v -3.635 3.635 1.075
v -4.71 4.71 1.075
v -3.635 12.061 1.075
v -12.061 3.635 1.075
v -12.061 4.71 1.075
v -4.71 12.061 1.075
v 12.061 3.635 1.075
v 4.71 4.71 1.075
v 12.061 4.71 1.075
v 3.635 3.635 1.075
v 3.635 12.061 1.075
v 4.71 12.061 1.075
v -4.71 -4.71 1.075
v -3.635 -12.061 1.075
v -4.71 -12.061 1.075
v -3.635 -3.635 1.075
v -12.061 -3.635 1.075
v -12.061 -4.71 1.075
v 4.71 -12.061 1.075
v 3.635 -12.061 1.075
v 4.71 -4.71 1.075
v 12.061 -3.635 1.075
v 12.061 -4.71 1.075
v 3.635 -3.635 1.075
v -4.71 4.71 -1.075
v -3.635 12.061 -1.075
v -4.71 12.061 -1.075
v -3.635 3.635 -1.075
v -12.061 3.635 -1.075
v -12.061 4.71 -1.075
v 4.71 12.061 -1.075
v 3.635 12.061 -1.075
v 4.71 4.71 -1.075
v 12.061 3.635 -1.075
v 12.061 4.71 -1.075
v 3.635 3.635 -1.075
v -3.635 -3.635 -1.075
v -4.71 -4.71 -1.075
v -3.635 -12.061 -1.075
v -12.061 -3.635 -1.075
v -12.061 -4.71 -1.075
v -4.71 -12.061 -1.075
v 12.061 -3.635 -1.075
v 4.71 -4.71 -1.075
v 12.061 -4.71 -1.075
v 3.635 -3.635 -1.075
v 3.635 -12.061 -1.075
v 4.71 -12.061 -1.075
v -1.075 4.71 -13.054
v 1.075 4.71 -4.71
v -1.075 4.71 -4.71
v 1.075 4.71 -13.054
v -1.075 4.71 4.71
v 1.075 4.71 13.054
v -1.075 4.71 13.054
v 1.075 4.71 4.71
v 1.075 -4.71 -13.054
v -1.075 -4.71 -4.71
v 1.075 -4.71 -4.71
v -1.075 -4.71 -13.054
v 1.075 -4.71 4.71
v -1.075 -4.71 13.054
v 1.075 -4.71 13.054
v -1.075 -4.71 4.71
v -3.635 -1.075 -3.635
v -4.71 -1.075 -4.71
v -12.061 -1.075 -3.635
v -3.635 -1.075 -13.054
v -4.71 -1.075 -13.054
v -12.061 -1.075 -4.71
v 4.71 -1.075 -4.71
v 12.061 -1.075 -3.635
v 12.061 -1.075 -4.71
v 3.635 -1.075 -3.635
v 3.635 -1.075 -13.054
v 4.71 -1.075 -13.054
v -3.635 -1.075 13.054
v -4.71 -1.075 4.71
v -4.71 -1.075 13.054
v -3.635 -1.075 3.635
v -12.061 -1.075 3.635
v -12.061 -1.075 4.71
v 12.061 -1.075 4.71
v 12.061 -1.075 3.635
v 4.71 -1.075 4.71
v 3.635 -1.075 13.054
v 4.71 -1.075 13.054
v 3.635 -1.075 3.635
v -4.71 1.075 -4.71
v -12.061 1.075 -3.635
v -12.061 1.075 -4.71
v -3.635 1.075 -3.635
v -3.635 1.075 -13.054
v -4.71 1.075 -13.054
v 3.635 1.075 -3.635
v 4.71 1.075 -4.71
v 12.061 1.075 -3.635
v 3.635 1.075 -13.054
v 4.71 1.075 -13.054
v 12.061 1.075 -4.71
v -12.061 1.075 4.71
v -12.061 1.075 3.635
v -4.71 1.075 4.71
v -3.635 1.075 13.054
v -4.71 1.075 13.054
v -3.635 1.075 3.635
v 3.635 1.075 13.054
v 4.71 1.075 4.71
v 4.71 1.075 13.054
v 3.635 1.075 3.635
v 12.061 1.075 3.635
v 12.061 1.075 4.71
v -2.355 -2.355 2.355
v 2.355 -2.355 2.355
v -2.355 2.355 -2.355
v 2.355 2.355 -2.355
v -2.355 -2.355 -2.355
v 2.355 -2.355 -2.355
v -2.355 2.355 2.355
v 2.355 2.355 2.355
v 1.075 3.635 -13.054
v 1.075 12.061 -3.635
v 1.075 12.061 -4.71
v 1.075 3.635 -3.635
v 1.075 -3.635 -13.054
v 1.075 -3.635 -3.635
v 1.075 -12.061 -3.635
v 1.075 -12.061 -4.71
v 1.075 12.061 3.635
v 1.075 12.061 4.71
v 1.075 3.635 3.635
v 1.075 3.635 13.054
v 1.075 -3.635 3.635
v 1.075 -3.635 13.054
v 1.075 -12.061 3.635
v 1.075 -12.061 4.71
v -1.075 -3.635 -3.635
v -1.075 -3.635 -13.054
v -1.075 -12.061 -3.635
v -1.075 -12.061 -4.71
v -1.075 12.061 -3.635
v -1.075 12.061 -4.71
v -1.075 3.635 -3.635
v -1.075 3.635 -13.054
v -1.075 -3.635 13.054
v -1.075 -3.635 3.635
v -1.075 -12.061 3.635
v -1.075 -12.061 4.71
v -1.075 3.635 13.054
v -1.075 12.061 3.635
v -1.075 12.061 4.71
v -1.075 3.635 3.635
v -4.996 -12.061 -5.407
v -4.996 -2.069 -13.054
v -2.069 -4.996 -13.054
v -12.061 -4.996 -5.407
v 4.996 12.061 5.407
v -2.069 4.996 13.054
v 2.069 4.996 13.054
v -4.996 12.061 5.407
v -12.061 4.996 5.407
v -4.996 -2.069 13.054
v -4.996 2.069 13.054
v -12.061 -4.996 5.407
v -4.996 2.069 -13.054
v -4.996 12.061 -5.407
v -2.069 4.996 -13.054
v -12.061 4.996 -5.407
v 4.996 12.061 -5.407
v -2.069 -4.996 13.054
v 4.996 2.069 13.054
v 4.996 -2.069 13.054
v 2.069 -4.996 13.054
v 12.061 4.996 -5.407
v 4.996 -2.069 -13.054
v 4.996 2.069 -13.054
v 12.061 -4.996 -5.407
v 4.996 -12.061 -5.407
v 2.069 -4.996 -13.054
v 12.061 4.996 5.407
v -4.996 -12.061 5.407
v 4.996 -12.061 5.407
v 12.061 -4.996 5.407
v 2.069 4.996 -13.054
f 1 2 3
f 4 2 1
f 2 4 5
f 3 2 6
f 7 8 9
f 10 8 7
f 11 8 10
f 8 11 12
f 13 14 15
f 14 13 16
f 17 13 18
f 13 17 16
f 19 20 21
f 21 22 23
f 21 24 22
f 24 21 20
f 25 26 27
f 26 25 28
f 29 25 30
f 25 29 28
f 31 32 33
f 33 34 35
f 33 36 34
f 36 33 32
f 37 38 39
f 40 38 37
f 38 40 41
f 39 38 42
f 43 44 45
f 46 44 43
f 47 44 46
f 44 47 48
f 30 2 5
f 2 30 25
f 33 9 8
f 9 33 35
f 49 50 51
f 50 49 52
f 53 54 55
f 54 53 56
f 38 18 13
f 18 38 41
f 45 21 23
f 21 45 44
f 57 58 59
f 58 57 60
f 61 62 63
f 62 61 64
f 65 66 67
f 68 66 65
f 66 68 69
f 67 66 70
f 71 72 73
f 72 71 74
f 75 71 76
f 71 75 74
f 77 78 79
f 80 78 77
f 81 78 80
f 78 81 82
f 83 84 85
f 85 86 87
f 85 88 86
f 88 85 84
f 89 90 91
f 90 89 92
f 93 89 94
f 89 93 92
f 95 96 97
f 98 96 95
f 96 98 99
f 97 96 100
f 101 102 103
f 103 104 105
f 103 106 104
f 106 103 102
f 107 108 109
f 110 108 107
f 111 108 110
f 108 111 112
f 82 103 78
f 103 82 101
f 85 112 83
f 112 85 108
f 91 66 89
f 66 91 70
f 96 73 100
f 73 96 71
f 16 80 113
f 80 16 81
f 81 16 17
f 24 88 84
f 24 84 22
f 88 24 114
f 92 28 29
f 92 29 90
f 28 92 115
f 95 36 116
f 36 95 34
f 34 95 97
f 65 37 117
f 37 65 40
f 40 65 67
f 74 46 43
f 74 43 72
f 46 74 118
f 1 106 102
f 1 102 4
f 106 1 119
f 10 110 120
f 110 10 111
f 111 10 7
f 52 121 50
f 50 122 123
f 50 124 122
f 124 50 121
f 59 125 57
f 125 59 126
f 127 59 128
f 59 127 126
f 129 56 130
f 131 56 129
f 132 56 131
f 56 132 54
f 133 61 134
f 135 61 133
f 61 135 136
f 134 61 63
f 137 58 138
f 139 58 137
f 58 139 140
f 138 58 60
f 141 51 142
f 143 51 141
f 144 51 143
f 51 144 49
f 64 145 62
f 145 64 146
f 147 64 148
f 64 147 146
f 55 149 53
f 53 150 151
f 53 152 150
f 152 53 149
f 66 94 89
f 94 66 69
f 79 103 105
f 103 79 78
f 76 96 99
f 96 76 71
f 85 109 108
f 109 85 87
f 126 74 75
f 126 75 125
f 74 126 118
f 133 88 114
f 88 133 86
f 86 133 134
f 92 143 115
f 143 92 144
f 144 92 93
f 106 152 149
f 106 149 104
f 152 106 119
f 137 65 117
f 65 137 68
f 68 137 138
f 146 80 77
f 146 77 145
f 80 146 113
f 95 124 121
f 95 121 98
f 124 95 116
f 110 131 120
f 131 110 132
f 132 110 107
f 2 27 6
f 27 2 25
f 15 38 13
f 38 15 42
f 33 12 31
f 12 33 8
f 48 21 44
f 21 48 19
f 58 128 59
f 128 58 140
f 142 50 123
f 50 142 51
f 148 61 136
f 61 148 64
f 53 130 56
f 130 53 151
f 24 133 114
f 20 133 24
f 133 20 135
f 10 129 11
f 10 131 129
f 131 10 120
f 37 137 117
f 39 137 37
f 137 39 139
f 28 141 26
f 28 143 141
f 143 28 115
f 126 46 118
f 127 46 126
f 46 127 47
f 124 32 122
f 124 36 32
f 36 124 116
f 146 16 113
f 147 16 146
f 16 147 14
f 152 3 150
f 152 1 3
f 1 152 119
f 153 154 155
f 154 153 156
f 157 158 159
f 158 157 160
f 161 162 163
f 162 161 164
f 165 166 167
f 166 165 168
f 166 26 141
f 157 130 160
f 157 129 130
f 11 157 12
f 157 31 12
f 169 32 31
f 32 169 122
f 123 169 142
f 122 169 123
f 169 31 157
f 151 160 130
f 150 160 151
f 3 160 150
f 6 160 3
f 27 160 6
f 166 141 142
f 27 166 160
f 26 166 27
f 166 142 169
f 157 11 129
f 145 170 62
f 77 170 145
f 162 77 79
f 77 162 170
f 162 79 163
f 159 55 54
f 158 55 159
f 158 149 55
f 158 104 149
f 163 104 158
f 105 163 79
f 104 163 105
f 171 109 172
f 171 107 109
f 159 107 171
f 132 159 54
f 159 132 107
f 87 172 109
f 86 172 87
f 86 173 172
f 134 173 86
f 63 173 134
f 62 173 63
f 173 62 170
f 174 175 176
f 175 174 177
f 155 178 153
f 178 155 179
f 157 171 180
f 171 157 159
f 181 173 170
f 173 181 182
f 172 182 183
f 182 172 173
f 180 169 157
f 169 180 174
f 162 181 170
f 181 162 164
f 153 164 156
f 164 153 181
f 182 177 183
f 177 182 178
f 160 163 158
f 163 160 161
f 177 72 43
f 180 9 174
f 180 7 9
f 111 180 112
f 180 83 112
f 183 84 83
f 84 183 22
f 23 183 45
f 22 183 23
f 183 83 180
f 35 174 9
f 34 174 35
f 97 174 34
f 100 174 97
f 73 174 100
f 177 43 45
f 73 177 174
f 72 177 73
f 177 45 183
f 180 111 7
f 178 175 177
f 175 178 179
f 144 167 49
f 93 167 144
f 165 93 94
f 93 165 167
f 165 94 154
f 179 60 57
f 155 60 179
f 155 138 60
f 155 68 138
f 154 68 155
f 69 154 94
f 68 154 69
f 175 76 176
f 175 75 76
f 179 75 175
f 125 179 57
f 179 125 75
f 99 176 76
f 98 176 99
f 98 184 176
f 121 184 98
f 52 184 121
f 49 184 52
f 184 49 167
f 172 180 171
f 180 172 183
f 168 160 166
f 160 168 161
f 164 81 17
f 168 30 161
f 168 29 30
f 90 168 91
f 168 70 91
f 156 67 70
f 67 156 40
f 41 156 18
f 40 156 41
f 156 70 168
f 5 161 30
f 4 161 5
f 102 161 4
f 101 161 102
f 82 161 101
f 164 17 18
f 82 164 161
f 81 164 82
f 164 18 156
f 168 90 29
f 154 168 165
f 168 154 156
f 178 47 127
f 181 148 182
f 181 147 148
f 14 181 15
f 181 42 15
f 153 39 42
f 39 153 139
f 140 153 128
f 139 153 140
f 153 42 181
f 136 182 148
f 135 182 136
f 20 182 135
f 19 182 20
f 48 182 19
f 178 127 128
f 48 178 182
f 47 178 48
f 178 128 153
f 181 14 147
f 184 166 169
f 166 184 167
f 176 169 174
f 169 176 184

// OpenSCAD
$fn=8;
stick_thick=2.15;
stick_width = 9.42;
size=stick_width * 1.5;
inside = stick_width / sqrt(2);

difference() {   
    rotate([0,0,22.5]) {
        sphere(r=size);
    }
    plus();
    rotate([0,90,0]) {
        plus();
    }
    rotate([0,0,90]) {
        plus();
    }
}

module plus() {
    cube([size * 2, stick_width, stick_thick], true);
    rotate([90,0,0]) {
        cube([size * 2, stick_width, stick_thick], true);
    }
    rotate([45,0,0]) {
        cube([size * 2, inside, inside], true);
    }
}
